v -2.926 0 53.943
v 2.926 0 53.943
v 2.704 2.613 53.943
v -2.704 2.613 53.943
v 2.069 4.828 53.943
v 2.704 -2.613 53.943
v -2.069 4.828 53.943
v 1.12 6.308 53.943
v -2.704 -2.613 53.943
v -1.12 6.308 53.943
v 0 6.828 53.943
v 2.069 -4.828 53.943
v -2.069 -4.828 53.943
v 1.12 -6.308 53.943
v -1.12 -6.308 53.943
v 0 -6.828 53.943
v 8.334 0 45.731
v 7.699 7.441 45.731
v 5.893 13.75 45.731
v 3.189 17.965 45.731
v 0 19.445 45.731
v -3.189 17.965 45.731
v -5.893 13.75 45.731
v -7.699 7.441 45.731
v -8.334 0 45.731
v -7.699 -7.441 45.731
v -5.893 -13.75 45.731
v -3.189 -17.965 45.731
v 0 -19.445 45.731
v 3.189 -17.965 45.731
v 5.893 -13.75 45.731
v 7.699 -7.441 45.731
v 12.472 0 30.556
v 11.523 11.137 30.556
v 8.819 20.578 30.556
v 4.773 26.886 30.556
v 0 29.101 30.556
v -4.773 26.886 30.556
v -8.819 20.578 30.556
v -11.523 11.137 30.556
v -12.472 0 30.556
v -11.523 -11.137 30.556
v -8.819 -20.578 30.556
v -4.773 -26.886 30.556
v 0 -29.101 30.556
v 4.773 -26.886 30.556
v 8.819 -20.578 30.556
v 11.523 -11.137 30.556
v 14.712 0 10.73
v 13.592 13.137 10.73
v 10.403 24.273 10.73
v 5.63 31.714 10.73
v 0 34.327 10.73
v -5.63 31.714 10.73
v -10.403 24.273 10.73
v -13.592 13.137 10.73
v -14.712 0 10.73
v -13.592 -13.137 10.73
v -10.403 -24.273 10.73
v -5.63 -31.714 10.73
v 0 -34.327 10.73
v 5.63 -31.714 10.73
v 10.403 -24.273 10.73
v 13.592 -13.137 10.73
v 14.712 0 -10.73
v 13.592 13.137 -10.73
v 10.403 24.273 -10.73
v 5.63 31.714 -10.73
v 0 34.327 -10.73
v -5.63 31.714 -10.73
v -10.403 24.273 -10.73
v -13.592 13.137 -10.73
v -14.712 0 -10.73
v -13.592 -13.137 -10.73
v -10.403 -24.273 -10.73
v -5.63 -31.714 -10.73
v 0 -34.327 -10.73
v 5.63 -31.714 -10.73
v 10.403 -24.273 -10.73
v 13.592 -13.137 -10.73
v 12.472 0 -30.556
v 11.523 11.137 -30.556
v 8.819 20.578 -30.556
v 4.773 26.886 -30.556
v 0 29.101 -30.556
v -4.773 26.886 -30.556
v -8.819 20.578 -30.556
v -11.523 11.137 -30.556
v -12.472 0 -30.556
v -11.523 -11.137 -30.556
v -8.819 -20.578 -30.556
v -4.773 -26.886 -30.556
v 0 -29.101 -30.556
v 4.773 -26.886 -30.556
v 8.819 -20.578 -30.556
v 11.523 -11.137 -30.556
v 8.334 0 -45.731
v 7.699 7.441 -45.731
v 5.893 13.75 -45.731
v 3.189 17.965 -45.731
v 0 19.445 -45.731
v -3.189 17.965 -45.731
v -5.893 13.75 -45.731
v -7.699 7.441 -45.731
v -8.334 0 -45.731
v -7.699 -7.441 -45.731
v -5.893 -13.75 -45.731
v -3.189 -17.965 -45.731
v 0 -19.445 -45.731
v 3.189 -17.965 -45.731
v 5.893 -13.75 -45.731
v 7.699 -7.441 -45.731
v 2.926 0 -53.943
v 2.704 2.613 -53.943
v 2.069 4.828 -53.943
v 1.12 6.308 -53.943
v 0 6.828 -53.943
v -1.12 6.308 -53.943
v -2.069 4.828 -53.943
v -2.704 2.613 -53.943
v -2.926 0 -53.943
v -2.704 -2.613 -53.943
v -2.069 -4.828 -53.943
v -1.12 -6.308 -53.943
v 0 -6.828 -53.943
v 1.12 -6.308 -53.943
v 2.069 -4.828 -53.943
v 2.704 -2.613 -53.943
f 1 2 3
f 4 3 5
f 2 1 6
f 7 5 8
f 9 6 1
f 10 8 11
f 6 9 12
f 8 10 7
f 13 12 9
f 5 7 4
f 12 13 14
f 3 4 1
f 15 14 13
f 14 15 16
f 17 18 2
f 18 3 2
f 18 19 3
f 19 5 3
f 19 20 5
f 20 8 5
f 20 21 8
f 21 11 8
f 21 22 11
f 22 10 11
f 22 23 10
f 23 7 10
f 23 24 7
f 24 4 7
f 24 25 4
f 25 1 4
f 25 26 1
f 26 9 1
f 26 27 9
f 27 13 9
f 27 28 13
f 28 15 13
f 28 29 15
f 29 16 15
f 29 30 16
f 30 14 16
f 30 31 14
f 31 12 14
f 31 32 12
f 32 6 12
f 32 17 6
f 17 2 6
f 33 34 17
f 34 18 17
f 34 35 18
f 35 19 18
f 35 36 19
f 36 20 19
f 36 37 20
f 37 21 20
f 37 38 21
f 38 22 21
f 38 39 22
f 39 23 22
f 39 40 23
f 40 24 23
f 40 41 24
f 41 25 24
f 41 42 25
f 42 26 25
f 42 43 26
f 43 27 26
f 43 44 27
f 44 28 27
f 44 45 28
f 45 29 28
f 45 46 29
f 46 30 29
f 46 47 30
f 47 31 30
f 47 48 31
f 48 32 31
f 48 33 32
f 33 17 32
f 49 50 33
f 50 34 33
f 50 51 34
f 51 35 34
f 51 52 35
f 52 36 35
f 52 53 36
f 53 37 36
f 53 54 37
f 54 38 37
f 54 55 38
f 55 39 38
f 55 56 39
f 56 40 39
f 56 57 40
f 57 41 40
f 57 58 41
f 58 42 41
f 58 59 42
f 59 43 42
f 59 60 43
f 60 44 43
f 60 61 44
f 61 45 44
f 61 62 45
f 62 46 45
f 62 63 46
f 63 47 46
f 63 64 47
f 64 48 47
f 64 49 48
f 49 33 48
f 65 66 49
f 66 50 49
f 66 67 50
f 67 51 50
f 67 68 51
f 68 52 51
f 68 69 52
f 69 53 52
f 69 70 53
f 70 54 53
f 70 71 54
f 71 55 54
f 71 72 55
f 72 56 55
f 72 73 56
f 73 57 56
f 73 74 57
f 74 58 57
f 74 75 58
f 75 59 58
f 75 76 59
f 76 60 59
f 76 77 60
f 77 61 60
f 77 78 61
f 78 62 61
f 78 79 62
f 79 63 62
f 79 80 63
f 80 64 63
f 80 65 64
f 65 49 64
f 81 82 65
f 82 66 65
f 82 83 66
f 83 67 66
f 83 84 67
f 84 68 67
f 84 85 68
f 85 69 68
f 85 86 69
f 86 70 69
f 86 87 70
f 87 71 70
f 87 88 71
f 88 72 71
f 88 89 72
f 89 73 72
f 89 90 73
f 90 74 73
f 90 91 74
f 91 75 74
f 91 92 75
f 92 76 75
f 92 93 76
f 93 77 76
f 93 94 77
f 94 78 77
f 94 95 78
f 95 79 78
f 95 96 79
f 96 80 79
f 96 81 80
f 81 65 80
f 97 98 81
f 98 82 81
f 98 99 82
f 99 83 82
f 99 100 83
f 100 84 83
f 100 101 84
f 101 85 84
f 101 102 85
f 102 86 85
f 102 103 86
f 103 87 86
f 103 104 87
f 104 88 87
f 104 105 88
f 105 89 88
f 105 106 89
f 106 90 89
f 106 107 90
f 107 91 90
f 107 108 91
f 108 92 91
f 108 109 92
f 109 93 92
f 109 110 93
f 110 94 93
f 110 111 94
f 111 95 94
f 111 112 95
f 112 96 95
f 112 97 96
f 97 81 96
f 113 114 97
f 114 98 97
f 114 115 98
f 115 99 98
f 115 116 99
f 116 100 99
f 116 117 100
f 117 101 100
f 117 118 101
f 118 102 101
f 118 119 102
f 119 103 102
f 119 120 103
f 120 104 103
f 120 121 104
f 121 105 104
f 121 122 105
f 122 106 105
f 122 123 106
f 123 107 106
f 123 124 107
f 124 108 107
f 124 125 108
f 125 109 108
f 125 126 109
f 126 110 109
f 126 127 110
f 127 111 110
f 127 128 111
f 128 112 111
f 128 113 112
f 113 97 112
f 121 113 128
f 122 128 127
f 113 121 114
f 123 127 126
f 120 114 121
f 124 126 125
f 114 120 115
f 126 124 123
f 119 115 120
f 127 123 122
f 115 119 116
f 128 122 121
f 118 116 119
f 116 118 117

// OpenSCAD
// Generated by SolidPython 1.0.1 on 2020-07-29 00:46:45


scale(v = [3, 7, 11]) {
	sphere(r = 5);
}
/***********************************************
*********      SolidPython code:      **********
************************************************
 
# import packages: SolidPython
from solid import *
from solid.utils import *
from itertools import chain, combinations, permutations


class Resize:

    def __init__(self, scad_file):
        self.scad_file = scad_file
        #self.scad_file = import_scad(scad_file)
        # cone/cylinder param:
        self.r1 = 0
        self.r2 = 0
        self.h = 0
        # rectangular prism param:
        self.w = 0
        self.l = 0
        # ellipse param:
        self.r = 0

    # import OpenScad code (file name corresponds to shape)


    # classify shape + parameters
    def assign(self, param1, param2, param3):
        if self.scad_file == 'cone.scad':
            self.r1 = param1
            self.r2 = param2
            self.h = param3
        elif self.scad_file == 'cylinder.scad':
            self.r1 = param1
            self.r2 = param2
            self.h = param3
        elif self.scad_file == 'rectangularPrism.scad':
            self.h = param1
            self.l = param2
            self.w = param3
        else:
            self.r = param1
            self.h = param2

    # resize parameters
    def iterate(self):
        x = range(3, 20, 2)
        i = 1
        if self.scad_file == 'cone.scad':
            tempList = list(permutations(x, 2))
            for temp in tempList:
                param1 = temp[0]
                param2 = temp[1]
                filepath = 'produced_scad_files/' + 'cone' + str(param1) + '_' + str(param2) + '_' + '.scad'
                scad_render_to_file(cylinder(h=param1, r1=param2, r2=0), filepath)

        elif self.scad_file == 'cylinder.scad':
            tempList = list(permutations(x, 3))
            for temp in tempList:
                param1 = temp[0]
                param2 = temp[1]
                filepath = 'produced_scad_files/' + 'cylinder' + str(param1) + '_' + str(param2) + '_' + '.scad'
                scad_render_to_file(cylinder(h=param1, r1=param2, r2=param2), filepath)

        elif self.scad_file == 'rectangularPrism.scad':
            tempList = list(permutations(x, 3))
            for temp in tempList:
                param1 = temp[0]
                param2 = temp[1]
                param3 = temp[2]
                filepath = 'produced_scad_files/' + 'rectangularPrism' + str(param1) + '_' + str(param2) + '_' + str(
                    param3) + '.scad'
                scad_render_to_file(cube(size=(param1, param2, param3)), filepath)

        elif self.scad_file == 'ellipse.scad':
            tempList = list(permutations(x, 4))
            for temp in tempList:
                param1 = temp[0]
                param2 = temp[1]
                param3 = temp[2]
                param4 = temp[3]
                filepath = 'produced_scad_files/' + 'ellipse' + str(param1) + '_' + str(param2) + '_' + str(param3) + '_' + str(param4) + '.scad'
                scad_render_to_file(scale([param1, param2, param3])(sphere(r=param4)), filepath)

    def render_to_scadfile(self):
        scad_render_to_file(scad, 'example.scad') 
 
************************************************/
